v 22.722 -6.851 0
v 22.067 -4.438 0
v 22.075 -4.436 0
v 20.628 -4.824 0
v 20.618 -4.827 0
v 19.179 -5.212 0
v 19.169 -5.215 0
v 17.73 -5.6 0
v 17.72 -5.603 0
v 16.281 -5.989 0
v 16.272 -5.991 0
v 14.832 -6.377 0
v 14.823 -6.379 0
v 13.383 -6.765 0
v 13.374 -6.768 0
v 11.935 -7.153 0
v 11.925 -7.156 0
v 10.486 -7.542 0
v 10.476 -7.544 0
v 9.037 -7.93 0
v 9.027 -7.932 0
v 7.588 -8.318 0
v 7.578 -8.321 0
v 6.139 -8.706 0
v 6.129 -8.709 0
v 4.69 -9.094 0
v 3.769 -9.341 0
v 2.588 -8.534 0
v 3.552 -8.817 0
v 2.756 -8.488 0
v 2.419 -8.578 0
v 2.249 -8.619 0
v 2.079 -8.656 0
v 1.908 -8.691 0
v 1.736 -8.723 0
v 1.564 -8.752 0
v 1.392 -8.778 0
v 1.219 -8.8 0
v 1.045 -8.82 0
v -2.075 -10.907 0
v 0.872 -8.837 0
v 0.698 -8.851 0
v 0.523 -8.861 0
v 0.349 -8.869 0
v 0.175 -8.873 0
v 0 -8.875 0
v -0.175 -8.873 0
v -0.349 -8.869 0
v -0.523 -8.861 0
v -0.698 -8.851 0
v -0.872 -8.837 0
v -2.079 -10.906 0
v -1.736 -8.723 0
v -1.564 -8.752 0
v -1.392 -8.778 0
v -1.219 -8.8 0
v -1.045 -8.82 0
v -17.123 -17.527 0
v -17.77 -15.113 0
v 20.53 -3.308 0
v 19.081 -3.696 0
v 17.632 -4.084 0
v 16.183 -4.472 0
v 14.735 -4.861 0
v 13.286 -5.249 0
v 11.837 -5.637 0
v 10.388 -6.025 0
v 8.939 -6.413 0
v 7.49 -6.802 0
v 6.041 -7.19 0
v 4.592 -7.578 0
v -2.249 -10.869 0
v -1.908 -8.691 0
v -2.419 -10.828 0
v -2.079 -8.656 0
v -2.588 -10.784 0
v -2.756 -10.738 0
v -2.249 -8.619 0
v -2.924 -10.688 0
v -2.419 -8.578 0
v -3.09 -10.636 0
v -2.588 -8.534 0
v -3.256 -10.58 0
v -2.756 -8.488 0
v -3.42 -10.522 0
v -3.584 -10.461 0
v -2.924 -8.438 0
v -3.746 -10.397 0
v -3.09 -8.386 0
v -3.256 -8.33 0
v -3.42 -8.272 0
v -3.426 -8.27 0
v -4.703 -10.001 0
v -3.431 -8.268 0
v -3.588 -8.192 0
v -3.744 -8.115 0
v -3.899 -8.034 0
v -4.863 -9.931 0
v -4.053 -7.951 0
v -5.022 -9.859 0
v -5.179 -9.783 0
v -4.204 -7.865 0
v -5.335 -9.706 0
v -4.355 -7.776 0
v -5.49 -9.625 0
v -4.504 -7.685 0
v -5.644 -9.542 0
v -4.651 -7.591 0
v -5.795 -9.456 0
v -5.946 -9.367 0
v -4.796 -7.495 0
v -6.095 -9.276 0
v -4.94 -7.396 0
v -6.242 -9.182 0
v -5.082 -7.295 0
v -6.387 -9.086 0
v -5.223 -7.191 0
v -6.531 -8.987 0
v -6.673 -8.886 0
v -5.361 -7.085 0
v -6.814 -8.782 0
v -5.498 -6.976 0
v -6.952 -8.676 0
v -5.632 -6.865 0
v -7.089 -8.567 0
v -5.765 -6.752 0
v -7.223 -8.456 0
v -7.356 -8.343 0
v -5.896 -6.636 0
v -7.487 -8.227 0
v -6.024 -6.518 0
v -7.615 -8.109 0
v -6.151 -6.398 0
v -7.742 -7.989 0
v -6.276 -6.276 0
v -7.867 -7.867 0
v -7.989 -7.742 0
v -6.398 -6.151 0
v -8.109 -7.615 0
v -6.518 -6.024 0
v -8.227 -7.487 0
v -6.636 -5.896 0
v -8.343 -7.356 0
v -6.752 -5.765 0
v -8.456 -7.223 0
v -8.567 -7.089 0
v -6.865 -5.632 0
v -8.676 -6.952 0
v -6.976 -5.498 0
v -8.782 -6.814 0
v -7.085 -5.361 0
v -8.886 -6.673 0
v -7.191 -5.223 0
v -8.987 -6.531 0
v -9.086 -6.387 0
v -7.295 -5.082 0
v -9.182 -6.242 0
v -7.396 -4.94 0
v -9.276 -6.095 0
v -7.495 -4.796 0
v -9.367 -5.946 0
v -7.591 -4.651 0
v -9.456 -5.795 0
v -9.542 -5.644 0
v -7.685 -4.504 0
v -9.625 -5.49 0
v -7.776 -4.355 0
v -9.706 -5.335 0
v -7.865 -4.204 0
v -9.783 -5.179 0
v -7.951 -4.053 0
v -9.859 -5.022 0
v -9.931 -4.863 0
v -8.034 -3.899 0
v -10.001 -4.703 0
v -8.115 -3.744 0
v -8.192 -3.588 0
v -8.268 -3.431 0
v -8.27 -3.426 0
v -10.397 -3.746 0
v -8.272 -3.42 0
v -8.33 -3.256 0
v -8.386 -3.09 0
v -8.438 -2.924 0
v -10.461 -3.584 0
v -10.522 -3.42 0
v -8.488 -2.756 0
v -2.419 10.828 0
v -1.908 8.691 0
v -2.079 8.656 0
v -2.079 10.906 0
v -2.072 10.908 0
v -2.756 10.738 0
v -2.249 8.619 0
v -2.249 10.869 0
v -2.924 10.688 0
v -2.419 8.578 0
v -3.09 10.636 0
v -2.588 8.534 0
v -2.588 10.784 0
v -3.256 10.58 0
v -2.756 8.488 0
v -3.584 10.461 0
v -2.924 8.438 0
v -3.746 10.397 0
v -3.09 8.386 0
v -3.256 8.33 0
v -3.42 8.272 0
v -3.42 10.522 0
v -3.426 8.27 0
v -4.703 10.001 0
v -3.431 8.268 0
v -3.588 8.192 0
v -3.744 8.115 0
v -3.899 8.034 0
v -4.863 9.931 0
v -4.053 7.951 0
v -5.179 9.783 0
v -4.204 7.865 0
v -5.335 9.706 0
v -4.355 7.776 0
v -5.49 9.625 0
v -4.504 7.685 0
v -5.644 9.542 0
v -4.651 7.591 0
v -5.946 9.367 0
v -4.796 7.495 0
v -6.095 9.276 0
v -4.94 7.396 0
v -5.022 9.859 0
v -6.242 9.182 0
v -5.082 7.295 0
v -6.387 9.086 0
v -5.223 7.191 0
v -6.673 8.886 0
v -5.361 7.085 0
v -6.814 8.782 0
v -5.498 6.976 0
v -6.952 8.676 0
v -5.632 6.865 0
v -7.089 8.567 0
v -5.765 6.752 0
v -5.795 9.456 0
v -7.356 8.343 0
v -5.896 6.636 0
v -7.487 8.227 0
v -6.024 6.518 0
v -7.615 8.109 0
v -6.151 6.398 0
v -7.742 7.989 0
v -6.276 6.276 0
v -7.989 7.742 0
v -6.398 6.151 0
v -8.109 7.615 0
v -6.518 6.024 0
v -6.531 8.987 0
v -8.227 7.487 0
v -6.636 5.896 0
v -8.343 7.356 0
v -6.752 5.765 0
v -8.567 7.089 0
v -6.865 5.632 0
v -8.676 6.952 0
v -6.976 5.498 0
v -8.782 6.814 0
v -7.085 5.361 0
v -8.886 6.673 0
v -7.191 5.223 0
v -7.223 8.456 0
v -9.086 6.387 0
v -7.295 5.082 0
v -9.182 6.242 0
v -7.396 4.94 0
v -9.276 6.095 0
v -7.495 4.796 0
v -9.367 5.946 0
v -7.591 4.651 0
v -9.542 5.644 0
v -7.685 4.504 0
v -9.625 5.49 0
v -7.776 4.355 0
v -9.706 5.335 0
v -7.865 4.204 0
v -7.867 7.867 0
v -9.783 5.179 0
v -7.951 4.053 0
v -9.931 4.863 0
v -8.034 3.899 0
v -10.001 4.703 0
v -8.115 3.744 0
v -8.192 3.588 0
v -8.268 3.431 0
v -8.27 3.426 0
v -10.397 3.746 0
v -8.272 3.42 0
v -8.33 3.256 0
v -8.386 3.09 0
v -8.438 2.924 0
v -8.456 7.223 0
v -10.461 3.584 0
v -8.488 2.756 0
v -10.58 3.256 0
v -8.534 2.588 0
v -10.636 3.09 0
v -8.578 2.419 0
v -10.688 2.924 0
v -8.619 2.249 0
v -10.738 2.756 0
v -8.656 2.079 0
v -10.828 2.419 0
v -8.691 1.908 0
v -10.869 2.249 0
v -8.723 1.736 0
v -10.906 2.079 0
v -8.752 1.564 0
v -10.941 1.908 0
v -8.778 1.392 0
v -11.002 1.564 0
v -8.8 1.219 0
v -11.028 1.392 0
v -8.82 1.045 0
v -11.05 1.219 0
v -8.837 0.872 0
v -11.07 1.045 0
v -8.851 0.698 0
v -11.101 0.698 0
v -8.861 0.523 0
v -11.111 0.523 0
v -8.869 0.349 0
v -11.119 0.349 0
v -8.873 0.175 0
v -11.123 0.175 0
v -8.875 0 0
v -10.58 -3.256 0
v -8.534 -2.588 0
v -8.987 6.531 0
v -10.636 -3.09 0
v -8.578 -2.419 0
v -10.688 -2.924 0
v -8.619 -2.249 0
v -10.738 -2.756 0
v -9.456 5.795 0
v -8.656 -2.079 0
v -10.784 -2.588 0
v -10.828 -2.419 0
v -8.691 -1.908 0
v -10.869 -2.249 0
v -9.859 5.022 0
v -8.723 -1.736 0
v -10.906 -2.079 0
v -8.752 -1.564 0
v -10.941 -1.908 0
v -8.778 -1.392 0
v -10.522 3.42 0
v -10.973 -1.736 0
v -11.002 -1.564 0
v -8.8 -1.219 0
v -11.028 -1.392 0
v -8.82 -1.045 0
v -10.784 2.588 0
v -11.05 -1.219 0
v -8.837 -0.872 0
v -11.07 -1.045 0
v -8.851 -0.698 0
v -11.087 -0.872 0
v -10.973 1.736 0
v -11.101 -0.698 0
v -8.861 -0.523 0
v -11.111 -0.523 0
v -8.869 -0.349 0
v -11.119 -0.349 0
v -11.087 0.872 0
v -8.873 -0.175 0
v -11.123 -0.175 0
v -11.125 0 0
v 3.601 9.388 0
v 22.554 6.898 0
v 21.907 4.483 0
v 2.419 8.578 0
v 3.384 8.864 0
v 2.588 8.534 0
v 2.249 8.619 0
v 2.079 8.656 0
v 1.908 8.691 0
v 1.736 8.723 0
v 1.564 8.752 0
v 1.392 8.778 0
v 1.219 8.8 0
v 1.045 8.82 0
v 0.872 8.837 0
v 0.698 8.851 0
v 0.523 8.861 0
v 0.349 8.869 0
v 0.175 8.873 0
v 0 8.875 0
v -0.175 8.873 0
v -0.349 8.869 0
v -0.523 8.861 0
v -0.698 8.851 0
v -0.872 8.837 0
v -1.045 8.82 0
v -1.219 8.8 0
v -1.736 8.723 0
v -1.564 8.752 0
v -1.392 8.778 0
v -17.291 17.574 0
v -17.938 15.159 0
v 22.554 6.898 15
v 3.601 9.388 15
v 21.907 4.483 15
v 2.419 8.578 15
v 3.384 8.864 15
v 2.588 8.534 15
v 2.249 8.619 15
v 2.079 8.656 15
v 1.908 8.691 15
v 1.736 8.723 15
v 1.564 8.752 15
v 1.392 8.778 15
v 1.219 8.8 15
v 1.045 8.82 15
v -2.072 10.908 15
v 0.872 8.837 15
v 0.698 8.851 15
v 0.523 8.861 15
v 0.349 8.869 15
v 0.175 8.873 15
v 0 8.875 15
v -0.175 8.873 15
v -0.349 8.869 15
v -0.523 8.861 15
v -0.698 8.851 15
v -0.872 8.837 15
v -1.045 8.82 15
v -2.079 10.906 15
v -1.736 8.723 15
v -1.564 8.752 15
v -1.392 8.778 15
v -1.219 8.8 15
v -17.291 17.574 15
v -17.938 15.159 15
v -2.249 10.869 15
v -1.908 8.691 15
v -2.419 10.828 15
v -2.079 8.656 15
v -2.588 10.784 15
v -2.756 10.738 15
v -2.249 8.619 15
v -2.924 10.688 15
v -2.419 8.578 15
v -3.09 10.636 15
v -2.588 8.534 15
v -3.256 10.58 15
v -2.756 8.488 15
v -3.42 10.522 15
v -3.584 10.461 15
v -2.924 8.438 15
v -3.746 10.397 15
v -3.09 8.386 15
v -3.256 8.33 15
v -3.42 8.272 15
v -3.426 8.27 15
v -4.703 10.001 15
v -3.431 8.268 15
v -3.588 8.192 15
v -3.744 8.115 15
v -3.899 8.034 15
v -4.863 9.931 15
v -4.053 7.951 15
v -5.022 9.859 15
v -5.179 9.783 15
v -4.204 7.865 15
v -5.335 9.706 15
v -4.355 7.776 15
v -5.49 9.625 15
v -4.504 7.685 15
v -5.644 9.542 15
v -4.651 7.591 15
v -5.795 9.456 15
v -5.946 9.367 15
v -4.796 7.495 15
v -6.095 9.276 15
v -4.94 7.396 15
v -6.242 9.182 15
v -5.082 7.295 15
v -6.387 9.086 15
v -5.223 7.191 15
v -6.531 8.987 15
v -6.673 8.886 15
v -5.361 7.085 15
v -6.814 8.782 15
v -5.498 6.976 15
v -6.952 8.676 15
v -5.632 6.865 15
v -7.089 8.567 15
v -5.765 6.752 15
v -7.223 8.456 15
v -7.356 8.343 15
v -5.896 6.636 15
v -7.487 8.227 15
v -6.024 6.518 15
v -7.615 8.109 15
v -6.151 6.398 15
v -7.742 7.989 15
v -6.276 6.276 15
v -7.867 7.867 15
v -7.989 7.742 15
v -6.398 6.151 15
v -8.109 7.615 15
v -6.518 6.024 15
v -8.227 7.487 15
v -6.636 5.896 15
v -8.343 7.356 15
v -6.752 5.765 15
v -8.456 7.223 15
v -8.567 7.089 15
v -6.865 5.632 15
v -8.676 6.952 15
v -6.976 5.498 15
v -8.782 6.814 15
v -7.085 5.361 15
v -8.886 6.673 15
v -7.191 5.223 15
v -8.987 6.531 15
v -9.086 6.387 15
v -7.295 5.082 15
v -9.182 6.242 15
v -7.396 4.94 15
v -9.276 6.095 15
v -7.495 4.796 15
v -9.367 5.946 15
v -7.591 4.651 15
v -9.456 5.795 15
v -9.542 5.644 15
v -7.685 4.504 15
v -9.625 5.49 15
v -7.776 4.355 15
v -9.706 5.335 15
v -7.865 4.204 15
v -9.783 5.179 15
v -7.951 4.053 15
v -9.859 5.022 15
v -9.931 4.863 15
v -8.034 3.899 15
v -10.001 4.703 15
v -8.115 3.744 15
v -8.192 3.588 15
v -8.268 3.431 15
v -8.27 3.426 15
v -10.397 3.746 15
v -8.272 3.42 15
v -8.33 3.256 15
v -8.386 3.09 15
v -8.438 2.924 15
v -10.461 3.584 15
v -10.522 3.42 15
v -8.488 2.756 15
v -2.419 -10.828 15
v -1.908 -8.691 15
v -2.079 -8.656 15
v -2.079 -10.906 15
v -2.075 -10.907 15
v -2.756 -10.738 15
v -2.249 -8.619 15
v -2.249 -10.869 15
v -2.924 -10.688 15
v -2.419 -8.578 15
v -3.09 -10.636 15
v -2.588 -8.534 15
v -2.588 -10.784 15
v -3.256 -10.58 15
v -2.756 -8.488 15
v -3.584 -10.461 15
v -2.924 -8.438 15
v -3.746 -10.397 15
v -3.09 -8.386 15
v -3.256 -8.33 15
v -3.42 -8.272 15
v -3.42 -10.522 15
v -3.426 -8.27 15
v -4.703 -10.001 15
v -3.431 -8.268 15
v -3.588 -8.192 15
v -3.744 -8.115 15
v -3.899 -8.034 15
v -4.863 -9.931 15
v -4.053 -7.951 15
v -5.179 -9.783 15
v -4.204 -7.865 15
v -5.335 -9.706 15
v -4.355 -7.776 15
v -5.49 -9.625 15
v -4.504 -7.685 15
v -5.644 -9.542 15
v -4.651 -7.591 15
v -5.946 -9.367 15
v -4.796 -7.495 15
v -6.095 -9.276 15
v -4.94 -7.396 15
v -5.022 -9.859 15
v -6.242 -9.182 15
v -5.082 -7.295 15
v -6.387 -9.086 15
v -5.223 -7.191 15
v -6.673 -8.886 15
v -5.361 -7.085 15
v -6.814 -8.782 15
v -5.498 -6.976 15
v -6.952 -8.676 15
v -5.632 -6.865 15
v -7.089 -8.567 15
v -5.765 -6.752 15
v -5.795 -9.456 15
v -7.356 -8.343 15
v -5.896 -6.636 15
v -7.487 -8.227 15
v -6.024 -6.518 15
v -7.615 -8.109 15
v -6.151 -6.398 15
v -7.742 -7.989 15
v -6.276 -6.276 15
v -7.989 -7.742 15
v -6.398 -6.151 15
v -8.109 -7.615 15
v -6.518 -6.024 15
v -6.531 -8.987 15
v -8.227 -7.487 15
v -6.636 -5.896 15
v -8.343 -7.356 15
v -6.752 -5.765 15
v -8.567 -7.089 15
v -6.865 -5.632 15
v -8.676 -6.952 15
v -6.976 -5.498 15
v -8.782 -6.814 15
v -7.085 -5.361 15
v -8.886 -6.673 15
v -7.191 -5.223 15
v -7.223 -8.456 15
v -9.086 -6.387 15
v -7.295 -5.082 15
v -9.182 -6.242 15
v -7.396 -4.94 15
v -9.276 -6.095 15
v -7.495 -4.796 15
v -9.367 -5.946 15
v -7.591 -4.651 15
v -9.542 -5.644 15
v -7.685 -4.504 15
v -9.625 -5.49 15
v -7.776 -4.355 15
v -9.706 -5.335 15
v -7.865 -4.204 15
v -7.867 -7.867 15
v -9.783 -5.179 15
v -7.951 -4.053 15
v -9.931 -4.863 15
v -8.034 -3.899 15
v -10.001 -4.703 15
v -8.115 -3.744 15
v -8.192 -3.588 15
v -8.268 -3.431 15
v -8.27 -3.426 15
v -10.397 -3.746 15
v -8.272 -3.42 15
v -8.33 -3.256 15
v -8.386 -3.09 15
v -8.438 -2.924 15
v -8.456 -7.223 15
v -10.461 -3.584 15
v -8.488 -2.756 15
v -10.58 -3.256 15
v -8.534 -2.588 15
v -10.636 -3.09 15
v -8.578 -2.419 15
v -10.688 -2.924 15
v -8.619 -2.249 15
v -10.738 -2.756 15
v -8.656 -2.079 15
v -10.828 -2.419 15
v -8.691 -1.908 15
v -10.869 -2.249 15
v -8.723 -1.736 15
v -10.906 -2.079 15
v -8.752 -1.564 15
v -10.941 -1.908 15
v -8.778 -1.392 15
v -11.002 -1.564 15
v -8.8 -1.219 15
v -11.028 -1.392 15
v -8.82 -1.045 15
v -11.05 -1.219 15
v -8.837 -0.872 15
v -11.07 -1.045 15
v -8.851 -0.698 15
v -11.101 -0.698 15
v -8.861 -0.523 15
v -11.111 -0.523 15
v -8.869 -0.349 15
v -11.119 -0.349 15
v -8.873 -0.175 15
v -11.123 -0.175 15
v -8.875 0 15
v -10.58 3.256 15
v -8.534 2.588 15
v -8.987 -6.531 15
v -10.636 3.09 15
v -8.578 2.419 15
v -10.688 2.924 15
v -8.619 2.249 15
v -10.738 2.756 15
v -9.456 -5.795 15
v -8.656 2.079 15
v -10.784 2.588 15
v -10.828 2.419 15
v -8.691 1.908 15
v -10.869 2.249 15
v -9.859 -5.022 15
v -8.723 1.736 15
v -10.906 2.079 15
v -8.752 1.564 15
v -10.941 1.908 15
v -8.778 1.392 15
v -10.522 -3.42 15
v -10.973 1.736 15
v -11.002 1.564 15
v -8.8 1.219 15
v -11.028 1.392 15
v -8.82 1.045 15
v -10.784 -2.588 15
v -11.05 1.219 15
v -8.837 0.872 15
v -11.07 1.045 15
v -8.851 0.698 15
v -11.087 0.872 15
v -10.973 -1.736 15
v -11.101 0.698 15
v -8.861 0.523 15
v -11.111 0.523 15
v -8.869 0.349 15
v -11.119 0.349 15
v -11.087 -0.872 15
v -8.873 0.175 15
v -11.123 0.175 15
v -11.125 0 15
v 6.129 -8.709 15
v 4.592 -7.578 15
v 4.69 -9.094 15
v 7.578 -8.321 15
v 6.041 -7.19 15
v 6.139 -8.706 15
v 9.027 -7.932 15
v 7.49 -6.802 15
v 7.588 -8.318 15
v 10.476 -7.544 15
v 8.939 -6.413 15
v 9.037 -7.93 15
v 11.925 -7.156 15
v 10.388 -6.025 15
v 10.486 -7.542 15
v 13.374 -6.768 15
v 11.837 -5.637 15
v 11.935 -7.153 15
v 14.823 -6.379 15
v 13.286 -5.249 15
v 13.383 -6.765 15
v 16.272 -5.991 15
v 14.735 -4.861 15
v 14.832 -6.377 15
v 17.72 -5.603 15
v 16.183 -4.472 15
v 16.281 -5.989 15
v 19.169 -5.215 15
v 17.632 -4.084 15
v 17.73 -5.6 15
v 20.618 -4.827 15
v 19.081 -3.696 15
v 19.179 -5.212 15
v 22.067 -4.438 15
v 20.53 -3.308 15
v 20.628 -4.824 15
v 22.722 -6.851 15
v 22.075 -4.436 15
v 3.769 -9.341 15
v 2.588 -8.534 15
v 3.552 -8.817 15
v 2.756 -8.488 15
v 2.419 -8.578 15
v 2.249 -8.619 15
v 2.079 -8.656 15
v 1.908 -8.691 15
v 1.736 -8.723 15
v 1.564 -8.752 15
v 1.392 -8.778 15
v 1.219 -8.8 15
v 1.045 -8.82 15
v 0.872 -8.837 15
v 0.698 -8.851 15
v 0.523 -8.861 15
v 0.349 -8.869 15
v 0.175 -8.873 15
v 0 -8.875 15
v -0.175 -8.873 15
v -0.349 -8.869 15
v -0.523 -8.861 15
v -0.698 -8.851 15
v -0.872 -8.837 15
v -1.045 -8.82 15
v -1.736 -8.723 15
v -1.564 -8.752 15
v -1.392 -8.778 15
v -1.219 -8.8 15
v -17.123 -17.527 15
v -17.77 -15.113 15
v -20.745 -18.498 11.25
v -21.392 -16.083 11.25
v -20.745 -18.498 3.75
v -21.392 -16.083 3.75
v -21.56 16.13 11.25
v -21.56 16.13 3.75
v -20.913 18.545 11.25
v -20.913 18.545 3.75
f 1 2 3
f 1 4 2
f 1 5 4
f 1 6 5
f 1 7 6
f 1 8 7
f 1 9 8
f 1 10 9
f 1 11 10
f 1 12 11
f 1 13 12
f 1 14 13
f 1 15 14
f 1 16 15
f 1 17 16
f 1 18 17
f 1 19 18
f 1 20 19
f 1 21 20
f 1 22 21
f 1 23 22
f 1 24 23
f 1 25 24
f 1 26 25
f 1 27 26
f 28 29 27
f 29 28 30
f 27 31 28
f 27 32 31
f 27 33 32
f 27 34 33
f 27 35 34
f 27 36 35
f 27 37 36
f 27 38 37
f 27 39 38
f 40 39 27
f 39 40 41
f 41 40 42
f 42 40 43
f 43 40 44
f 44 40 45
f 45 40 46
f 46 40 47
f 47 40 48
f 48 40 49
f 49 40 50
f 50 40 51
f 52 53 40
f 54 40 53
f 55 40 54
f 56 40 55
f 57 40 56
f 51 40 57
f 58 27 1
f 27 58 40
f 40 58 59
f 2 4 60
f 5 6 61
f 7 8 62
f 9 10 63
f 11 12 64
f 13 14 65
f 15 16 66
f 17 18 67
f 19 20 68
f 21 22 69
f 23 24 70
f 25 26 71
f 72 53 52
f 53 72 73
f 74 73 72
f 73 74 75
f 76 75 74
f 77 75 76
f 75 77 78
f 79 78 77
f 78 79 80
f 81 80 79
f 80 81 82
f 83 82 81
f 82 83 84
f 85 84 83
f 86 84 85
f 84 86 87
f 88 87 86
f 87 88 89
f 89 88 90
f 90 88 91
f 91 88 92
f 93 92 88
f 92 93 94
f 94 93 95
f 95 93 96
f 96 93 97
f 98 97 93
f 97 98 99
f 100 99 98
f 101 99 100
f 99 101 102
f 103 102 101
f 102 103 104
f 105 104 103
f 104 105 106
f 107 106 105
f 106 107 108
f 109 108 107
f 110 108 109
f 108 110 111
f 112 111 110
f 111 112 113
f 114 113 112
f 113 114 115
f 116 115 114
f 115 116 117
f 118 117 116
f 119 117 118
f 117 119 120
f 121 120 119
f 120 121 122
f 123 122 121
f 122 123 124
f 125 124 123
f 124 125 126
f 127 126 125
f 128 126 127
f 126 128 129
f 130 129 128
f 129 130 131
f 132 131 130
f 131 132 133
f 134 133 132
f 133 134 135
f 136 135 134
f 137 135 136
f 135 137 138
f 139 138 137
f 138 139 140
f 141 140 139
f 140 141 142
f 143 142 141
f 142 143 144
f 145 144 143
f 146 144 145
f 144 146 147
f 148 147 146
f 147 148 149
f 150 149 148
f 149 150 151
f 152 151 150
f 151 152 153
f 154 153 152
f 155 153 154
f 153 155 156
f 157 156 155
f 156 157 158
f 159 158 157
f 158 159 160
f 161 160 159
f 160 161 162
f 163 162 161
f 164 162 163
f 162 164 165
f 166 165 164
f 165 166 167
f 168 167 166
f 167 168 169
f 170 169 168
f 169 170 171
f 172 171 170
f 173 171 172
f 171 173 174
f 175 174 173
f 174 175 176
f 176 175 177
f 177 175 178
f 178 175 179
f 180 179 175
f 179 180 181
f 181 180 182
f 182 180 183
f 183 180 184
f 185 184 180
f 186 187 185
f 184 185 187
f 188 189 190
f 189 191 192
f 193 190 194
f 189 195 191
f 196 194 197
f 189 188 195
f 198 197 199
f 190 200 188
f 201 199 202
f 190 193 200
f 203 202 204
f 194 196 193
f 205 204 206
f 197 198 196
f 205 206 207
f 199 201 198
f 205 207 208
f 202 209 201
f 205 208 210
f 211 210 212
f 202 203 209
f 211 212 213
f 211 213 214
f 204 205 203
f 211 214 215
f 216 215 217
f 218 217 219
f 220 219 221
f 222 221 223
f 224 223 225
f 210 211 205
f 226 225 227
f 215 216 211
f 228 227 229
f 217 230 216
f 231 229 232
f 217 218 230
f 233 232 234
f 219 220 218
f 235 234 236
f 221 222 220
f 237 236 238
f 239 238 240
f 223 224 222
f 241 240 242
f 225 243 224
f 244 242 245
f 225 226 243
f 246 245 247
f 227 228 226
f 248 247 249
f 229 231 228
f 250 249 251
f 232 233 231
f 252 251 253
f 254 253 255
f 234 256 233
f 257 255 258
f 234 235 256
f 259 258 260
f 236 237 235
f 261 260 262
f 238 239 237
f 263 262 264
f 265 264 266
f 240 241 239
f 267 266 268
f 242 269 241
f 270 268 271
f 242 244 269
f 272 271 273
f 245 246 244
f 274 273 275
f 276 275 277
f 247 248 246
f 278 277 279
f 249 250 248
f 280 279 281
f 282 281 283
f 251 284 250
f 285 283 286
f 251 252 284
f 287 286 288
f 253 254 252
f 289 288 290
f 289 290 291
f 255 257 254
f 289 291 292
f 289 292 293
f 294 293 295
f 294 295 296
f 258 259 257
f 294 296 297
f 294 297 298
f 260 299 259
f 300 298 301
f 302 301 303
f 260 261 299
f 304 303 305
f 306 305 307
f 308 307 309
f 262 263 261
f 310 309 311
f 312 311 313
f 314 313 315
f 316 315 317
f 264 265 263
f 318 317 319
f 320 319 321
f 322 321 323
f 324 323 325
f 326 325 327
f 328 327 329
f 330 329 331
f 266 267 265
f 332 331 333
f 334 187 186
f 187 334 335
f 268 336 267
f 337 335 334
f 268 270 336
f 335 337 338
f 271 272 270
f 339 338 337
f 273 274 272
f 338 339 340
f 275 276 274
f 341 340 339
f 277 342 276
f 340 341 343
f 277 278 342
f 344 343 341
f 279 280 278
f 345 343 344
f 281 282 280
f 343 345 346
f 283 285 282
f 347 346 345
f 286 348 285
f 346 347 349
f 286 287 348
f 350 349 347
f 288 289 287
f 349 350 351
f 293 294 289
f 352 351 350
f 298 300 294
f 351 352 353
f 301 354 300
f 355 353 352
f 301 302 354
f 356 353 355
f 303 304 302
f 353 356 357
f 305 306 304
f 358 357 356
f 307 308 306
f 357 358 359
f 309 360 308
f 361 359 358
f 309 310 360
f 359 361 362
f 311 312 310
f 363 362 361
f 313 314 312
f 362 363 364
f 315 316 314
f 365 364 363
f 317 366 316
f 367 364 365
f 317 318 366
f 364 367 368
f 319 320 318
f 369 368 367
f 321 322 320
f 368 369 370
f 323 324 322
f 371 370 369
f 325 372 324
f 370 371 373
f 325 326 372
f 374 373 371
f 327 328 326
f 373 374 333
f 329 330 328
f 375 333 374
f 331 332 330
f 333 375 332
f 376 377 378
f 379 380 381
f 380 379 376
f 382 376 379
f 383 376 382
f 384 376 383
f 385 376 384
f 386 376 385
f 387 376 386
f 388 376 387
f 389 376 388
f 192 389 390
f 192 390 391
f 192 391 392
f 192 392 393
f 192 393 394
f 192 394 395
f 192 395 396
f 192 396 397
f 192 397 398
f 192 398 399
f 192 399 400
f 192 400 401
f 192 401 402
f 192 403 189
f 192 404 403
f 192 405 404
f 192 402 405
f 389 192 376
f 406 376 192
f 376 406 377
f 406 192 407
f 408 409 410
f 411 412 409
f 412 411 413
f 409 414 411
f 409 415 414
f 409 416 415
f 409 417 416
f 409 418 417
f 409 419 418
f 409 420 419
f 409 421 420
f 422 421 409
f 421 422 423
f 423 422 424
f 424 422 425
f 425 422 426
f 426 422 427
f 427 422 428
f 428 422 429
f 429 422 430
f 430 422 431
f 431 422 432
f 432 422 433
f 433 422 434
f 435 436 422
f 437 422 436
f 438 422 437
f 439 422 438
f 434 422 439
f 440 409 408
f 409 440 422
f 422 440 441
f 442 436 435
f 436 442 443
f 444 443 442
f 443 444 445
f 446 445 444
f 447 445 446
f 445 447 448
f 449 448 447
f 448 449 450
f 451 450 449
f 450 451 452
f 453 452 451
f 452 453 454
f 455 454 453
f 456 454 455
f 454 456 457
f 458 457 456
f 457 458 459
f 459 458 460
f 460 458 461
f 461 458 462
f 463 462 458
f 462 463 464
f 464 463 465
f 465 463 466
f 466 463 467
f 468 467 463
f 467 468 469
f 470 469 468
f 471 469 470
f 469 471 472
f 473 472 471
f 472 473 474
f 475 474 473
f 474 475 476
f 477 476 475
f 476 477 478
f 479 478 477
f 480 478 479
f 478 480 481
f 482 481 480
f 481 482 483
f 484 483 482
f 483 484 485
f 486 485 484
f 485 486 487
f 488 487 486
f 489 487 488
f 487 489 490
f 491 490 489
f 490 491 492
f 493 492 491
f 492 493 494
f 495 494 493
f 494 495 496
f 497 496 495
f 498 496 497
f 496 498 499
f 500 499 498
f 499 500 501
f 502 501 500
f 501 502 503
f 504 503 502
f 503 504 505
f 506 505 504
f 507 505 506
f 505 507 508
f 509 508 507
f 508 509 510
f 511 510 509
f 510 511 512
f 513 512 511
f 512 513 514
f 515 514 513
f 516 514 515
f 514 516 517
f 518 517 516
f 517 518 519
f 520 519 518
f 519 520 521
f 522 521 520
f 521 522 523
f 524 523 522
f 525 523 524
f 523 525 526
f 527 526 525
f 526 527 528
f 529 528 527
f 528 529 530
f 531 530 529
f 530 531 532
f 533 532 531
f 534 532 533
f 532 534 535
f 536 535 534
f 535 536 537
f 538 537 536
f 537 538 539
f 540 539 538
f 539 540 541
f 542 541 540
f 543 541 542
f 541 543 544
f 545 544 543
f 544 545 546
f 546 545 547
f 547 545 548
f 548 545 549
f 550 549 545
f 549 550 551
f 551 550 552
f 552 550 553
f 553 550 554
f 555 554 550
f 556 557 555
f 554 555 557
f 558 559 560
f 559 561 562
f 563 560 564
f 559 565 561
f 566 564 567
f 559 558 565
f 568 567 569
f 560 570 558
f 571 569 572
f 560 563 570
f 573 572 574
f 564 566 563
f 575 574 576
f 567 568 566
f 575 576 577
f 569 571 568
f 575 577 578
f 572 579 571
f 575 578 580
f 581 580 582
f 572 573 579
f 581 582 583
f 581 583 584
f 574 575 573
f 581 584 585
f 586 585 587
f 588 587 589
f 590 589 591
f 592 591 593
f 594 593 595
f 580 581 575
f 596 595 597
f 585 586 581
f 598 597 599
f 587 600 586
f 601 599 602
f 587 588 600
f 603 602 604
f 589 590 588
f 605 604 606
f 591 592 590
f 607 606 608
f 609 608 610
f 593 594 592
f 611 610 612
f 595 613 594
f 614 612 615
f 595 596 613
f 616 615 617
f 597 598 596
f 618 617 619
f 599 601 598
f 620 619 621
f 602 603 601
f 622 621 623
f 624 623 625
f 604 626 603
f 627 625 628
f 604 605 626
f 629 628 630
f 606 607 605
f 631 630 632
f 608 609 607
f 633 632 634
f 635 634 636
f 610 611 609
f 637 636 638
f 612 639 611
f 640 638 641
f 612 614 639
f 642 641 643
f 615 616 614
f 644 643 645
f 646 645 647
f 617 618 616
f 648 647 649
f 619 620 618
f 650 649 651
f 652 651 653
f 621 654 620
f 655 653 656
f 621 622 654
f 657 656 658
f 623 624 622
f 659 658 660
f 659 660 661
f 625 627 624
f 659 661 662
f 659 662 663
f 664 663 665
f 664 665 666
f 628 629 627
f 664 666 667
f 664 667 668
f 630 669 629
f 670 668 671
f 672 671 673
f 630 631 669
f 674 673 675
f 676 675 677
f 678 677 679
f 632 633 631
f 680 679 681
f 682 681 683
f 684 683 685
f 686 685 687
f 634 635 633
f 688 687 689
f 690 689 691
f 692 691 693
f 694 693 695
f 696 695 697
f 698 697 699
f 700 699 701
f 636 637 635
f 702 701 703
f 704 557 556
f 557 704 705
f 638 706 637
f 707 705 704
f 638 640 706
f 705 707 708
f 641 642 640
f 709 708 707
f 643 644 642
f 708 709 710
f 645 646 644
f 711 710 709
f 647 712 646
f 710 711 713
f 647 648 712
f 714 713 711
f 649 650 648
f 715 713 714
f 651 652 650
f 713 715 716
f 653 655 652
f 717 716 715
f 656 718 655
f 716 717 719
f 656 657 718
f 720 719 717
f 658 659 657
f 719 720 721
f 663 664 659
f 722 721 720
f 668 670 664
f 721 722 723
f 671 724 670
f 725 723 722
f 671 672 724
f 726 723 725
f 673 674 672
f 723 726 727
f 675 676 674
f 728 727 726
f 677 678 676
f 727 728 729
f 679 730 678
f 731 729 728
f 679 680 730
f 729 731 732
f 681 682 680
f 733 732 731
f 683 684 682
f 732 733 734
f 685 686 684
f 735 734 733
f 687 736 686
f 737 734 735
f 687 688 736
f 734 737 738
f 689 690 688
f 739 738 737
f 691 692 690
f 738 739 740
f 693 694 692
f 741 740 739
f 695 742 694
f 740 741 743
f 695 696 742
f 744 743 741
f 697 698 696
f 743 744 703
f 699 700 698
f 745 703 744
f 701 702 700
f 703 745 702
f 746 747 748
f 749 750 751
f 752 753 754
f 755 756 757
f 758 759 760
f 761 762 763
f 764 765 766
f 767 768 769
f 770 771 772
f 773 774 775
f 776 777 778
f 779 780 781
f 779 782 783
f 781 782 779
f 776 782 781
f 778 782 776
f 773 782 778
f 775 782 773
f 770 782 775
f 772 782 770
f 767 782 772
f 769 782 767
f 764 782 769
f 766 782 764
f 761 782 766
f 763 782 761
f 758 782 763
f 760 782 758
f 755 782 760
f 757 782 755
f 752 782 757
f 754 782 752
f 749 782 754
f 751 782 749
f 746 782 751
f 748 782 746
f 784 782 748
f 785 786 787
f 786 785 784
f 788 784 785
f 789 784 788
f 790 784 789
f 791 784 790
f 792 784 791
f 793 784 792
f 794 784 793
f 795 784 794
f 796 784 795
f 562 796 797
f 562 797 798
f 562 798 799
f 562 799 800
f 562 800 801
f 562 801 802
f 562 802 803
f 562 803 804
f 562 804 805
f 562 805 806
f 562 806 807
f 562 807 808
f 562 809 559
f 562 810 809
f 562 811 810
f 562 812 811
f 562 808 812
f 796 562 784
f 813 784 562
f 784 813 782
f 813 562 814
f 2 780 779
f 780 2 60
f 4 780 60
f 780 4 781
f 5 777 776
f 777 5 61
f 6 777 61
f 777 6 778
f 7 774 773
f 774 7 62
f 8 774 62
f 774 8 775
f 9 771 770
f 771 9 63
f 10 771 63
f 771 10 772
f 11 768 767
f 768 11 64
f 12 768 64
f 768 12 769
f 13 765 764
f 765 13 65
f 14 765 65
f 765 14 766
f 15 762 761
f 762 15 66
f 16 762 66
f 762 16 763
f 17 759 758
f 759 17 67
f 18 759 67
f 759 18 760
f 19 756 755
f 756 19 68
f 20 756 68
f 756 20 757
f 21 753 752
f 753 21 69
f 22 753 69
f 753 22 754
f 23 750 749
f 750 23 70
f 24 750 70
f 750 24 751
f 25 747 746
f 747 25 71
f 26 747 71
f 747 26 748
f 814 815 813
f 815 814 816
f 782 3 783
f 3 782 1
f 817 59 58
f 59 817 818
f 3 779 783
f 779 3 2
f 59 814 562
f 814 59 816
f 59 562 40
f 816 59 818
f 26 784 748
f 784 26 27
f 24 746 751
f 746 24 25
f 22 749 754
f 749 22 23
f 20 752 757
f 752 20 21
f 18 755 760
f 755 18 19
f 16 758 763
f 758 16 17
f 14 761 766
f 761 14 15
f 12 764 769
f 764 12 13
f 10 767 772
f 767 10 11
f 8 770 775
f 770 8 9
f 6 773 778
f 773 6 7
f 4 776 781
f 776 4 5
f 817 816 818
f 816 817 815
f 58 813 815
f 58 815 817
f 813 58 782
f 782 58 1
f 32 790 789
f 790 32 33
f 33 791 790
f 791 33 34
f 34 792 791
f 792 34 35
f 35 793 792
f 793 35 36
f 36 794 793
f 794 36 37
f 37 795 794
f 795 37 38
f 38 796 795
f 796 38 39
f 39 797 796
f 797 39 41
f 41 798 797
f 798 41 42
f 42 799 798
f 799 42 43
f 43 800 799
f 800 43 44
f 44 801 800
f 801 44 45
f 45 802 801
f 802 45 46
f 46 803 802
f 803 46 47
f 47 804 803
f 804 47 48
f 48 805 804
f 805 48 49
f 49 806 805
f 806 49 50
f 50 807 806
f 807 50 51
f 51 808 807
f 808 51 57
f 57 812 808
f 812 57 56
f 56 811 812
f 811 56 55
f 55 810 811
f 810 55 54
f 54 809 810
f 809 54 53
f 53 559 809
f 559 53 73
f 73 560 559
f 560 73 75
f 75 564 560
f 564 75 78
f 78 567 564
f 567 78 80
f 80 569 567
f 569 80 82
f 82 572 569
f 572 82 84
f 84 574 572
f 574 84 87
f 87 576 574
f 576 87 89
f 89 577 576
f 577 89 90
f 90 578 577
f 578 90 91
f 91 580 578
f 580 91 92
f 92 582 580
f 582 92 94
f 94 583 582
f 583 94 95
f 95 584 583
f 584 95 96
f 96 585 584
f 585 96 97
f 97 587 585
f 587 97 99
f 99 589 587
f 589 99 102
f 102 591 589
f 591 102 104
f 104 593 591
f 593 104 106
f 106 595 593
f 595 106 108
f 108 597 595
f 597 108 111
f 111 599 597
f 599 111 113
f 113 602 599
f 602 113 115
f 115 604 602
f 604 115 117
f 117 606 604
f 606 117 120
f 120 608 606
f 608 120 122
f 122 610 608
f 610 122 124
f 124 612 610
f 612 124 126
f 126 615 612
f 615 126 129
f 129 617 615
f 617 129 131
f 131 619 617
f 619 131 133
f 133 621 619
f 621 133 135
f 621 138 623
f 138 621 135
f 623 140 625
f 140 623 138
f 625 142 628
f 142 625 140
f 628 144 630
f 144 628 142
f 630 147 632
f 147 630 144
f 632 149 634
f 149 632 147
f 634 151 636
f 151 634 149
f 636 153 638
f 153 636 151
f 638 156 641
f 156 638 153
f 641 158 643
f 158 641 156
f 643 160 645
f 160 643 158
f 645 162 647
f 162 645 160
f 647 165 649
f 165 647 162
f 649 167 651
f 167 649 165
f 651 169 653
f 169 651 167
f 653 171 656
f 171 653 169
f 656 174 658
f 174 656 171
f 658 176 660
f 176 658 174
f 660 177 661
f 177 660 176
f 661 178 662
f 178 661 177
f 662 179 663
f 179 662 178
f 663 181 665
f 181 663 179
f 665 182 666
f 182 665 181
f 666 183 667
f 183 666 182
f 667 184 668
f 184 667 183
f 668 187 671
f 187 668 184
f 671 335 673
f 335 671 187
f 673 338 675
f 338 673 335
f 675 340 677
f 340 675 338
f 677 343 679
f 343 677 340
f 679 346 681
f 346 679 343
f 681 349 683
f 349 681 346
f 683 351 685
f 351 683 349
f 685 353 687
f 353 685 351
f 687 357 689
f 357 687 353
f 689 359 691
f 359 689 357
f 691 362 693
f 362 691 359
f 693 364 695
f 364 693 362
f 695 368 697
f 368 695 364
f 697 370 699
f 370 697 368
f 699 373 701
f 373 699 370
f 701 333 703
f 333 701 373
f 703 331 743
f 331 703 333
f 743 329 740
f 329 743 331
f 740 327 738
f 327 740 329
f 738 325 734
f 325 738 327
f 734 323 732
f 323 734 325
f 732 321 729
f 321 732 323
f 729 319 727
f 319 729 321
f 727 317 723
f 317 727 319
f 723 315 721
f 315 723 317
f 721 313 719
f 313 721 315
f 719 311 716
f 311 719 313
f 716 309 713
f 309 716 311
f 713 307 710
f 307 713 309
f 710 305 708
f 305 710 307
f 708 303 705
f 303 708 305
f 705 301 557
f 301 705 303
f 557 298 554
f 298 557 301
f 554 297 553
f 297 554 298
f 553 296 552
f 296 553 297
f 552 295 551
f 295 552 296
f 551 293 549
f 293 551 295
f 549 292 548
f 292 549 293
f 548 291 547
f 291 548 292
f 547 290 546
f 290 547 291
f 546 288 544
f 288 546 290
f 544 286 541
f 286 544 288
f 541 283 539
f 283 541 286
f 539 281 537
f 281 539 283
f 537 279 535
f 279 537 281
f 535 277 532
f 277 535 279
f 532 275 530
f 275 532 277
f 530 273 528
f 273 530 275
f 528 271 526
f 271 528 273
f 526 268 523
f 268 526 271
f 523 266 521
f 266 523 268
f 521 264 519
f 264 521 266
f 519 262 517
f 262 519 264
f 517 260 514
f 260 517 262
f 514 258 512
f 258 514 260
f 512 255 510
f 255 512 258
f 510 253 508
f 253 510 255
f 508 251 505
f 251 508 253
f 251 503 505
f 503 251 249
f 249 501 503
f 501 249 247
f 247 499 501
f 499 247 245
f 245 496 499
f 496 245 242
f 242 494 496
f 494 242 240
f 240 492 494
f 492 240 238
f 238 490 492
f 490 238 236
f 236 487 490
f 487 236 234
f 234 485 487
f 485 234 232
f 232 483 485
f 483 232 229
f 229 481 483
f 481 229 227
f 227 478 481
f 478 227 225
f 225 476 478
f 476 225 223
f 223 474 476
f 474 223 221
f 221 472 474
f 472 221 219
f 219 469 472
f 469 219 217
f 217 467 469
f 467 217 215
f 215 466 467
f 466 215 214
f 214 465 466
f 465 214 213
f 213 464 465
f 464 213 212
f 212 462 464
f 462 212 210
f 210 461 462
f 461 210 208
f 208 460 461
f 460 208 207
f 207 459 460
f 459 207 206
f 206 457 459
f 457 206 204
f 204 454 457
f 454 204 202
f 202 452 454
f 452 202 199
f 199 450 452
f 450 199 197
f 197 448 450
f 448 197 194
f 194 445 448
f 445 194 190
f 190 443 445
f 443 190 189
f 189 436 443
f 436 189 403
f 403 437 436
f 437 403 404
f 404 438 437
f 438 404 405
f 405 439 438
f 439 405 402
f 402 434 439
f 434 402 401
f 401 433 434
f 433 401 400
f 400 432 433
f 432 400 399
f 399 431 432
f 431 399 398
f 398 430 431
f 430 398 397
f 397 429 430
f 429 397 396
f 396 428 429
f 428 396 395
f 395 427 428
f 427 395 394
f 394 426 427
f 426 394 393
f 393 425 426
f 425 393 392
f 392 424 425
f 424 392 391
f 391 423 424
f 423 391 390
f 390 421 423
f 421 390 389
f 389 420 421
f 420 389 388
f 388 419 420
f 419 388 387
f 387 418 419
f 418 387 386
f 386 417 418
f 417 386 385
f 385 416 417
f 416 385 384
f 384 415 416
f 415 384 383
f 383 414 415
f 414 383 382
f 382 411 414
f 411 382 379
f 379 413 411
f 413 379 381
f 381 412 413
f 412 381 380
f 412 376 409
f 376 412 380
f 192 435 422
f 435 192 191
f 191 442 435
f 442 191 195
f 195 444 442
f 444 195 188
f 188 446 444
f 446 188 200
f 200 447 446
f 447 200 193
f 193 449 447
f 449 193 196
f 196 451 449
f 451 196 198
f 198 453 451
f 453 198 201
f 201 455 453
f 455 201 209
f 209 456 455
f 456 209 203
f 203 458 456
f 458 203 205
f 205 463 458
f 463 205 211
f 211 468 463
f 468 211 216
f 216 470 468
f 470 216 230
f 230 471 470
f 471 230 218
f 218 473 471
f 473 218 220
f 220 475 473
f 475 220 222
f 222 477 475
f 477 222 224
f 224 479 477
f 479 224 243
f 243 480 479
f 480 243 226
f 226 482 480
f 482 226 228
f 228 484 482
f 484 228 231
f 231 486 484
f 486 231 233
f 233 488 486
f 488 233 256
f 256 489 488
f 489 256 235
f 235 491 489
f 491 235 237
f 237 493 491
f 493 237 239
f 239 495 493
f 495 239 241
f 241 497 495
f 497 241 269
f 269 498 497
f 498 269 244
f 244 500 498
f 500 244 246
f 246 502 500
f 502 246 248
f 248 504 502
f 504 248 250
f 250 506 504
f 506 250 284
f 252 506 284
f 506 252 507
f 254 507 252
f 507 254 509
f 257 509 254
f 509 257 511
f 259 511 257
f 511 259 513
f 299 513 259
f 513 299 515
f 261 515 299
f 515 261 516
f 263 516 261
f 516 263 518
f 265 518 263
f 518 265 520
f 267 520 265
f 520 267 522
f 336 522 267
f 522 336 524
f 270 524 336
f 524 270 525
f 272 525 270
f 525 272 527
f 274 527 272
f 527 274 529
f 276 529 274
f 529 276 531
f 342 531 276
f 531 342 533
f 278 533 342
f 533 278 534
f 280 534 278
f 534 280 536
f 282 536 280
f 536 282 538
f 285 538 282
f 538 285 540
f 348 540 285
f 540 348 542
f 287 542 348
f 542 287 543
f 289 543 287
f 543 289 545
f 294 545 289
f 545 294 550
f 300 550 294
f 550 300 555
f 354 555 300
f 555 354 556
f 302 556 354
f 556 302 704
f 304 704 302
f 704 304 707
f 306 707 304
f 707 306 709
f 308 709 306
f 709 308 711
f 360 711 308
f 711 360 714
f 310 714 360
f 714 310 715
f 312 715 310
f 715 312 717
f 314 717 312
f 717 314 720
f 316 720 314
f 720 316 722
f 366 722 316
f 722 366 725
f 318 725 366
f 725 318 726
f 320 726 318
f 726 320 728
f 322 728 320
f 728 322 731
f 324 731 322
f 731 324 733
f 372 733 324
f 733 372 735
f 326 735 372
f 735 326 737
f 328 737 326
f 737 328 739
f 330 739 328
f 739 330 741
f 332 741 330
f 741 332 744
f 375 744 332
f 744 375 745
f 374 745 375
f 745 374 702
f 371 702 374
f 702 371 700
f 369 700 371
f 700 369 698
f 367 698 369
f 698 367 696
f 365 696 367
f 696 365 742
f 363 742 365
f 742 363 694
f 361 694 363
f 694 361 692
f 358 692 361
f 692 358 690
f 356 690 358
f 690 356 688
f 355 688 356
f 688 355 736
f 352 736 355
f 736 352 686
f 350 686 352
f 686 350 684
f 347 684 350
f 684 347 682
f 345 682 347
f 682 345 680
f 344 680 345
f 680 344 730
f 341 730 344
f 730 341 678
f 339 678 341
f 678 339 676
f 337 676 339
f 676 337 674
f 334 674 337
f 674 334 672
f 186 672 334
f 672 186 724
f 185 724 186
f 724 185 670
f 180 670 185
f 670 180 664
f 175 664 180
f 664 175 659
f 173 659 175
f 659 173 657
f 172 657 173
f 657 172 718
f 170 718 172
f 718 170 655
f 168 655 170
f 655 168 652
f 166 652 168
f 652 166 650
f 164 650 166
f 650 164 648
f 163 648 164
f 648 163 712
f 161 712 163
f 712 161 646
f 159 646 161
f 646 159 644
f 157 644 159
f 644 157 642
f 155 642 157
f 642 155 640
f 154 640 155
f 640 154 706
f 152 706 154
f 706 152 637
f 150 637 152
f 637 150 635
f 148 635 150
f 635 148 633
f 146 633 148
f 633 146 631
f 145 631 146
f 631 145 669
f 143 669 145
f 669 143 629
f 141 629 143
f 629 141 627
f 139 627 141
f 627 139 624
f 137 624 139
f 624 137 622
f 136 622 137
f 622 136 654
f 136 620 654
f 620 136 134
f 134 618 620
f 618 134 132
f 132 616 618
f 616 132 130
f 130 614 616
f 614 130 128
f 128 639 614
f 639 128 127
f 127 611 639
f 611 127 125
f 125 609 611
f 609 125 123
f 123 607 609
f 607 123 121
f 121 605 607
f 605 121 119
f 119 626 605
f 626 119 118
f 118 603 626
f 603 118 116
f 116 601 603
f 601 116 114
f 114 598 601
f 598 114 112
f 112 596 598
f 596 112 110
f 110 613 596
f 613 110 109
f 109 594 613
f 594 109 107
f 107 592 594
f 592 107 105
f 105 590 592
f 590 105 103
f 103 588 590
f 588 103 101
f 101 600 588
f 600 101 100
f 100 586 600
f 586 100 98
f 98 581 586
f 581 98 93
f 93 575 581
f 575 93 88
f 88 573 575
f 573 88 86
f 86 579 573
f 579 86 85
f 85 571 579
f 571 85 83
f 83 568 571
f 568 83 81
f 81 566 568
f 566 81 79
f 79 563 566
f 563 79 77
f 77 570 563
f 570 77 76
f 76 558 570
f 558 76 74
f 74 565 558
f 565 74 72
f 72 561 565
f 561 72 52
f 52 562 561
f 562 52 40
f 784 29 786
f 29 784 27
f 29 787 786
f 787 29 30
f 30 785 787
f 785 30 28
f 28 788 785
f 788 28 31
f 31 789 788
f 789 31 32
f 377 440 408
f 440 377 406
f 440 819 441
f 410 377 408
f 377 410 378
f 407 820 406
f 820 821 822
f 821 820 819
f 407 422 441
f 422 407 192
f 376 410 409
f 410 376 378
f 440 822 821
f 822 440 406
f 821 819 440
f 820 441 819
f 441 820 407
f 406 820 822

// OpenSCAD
width = 15;
spacing = 20;
restAngle = 30;
jawLength = 20;
handleLength = 25;
jawThickness = 2.5;
bottomTeethOffset = 1;
bottomToothHeight = 1.5;
bottomToothWidth = 1.5;
bottomToothSet = 0.2; // 0.5 for symmetric teeth
topTeethOffset = 1;
topToothHeight = 0;
topToothWidth = 1.5;
topToothSet = 0.3; // 0.5 for symmetric teeth
springThickness = 2.25;

module dummy(){}

nudge = 0.01;

module ribbon(points, thickness=1, closed=false) {
    p = closed ? concat(points, [points[0]]) : points;
    
    union() {
        for (i=[1:len(p)-1]) {
            hull() {
                translate(p[i-1]) circle(d=thickness, $fn=8);
                translate(p[i]) circle(d=thickness, $fn=8);
            }
        }
    }
}

module jaw(toothHeight, toothWidth, toothSet, teethOffset) {
    translate([-handleLength,-jawThickness]) {
       translate([0,0,width]) rotate([-90,0,0]) 
        linear_extrude(height=jawThickness) 
        polygon([[jawLength+handleLength,width],[jawLength+handleLength,0],[0.25*width,0],[0,0.25*width],[0,0.75*width],[0.25*width,width]]);
         {
            if (toothHeight > 0) {
               n = floor((jawLength-teethOffset) / toothWidth);
               for (i=[0:n-1]) {
                   x = jawLength+handleLength - (i+1)*toothWidth;           
                   translate([0,-nudge])
                   linear_extrude(height=width)
                   polygon([[x,jawThickness],[x+toothWidth*toothSet,jawThickness+toothHeight],[x+toothWidth,jawThickness]]);
               } 
            }
        }
    }
}


circleAngle = 90.-restAngle/2.;

springPoints = [for (n=[circleAngle:1:360-circleAngle+1]) (spacing/2)*[cos(n),sin(n)]];
    
linear_extrude(height=width) {
    ribbon(springPoints, thickness=springThickness);
}

    translate(springPoints[len(springPoints)-1])    
    rotate([0,0,restAngle/2.]) jaw(bottomToothHeight, bottomToothWidth, bottomToothSet, bottomTeethOffset);
    translate(springPoints[0]) rotate([0,0,-restAngle/2.]) translate([0,0,width]) rotate([180,0,0]) jaw(topToothHeight, topToothWidth, topToothSet, topTeethOffset);
